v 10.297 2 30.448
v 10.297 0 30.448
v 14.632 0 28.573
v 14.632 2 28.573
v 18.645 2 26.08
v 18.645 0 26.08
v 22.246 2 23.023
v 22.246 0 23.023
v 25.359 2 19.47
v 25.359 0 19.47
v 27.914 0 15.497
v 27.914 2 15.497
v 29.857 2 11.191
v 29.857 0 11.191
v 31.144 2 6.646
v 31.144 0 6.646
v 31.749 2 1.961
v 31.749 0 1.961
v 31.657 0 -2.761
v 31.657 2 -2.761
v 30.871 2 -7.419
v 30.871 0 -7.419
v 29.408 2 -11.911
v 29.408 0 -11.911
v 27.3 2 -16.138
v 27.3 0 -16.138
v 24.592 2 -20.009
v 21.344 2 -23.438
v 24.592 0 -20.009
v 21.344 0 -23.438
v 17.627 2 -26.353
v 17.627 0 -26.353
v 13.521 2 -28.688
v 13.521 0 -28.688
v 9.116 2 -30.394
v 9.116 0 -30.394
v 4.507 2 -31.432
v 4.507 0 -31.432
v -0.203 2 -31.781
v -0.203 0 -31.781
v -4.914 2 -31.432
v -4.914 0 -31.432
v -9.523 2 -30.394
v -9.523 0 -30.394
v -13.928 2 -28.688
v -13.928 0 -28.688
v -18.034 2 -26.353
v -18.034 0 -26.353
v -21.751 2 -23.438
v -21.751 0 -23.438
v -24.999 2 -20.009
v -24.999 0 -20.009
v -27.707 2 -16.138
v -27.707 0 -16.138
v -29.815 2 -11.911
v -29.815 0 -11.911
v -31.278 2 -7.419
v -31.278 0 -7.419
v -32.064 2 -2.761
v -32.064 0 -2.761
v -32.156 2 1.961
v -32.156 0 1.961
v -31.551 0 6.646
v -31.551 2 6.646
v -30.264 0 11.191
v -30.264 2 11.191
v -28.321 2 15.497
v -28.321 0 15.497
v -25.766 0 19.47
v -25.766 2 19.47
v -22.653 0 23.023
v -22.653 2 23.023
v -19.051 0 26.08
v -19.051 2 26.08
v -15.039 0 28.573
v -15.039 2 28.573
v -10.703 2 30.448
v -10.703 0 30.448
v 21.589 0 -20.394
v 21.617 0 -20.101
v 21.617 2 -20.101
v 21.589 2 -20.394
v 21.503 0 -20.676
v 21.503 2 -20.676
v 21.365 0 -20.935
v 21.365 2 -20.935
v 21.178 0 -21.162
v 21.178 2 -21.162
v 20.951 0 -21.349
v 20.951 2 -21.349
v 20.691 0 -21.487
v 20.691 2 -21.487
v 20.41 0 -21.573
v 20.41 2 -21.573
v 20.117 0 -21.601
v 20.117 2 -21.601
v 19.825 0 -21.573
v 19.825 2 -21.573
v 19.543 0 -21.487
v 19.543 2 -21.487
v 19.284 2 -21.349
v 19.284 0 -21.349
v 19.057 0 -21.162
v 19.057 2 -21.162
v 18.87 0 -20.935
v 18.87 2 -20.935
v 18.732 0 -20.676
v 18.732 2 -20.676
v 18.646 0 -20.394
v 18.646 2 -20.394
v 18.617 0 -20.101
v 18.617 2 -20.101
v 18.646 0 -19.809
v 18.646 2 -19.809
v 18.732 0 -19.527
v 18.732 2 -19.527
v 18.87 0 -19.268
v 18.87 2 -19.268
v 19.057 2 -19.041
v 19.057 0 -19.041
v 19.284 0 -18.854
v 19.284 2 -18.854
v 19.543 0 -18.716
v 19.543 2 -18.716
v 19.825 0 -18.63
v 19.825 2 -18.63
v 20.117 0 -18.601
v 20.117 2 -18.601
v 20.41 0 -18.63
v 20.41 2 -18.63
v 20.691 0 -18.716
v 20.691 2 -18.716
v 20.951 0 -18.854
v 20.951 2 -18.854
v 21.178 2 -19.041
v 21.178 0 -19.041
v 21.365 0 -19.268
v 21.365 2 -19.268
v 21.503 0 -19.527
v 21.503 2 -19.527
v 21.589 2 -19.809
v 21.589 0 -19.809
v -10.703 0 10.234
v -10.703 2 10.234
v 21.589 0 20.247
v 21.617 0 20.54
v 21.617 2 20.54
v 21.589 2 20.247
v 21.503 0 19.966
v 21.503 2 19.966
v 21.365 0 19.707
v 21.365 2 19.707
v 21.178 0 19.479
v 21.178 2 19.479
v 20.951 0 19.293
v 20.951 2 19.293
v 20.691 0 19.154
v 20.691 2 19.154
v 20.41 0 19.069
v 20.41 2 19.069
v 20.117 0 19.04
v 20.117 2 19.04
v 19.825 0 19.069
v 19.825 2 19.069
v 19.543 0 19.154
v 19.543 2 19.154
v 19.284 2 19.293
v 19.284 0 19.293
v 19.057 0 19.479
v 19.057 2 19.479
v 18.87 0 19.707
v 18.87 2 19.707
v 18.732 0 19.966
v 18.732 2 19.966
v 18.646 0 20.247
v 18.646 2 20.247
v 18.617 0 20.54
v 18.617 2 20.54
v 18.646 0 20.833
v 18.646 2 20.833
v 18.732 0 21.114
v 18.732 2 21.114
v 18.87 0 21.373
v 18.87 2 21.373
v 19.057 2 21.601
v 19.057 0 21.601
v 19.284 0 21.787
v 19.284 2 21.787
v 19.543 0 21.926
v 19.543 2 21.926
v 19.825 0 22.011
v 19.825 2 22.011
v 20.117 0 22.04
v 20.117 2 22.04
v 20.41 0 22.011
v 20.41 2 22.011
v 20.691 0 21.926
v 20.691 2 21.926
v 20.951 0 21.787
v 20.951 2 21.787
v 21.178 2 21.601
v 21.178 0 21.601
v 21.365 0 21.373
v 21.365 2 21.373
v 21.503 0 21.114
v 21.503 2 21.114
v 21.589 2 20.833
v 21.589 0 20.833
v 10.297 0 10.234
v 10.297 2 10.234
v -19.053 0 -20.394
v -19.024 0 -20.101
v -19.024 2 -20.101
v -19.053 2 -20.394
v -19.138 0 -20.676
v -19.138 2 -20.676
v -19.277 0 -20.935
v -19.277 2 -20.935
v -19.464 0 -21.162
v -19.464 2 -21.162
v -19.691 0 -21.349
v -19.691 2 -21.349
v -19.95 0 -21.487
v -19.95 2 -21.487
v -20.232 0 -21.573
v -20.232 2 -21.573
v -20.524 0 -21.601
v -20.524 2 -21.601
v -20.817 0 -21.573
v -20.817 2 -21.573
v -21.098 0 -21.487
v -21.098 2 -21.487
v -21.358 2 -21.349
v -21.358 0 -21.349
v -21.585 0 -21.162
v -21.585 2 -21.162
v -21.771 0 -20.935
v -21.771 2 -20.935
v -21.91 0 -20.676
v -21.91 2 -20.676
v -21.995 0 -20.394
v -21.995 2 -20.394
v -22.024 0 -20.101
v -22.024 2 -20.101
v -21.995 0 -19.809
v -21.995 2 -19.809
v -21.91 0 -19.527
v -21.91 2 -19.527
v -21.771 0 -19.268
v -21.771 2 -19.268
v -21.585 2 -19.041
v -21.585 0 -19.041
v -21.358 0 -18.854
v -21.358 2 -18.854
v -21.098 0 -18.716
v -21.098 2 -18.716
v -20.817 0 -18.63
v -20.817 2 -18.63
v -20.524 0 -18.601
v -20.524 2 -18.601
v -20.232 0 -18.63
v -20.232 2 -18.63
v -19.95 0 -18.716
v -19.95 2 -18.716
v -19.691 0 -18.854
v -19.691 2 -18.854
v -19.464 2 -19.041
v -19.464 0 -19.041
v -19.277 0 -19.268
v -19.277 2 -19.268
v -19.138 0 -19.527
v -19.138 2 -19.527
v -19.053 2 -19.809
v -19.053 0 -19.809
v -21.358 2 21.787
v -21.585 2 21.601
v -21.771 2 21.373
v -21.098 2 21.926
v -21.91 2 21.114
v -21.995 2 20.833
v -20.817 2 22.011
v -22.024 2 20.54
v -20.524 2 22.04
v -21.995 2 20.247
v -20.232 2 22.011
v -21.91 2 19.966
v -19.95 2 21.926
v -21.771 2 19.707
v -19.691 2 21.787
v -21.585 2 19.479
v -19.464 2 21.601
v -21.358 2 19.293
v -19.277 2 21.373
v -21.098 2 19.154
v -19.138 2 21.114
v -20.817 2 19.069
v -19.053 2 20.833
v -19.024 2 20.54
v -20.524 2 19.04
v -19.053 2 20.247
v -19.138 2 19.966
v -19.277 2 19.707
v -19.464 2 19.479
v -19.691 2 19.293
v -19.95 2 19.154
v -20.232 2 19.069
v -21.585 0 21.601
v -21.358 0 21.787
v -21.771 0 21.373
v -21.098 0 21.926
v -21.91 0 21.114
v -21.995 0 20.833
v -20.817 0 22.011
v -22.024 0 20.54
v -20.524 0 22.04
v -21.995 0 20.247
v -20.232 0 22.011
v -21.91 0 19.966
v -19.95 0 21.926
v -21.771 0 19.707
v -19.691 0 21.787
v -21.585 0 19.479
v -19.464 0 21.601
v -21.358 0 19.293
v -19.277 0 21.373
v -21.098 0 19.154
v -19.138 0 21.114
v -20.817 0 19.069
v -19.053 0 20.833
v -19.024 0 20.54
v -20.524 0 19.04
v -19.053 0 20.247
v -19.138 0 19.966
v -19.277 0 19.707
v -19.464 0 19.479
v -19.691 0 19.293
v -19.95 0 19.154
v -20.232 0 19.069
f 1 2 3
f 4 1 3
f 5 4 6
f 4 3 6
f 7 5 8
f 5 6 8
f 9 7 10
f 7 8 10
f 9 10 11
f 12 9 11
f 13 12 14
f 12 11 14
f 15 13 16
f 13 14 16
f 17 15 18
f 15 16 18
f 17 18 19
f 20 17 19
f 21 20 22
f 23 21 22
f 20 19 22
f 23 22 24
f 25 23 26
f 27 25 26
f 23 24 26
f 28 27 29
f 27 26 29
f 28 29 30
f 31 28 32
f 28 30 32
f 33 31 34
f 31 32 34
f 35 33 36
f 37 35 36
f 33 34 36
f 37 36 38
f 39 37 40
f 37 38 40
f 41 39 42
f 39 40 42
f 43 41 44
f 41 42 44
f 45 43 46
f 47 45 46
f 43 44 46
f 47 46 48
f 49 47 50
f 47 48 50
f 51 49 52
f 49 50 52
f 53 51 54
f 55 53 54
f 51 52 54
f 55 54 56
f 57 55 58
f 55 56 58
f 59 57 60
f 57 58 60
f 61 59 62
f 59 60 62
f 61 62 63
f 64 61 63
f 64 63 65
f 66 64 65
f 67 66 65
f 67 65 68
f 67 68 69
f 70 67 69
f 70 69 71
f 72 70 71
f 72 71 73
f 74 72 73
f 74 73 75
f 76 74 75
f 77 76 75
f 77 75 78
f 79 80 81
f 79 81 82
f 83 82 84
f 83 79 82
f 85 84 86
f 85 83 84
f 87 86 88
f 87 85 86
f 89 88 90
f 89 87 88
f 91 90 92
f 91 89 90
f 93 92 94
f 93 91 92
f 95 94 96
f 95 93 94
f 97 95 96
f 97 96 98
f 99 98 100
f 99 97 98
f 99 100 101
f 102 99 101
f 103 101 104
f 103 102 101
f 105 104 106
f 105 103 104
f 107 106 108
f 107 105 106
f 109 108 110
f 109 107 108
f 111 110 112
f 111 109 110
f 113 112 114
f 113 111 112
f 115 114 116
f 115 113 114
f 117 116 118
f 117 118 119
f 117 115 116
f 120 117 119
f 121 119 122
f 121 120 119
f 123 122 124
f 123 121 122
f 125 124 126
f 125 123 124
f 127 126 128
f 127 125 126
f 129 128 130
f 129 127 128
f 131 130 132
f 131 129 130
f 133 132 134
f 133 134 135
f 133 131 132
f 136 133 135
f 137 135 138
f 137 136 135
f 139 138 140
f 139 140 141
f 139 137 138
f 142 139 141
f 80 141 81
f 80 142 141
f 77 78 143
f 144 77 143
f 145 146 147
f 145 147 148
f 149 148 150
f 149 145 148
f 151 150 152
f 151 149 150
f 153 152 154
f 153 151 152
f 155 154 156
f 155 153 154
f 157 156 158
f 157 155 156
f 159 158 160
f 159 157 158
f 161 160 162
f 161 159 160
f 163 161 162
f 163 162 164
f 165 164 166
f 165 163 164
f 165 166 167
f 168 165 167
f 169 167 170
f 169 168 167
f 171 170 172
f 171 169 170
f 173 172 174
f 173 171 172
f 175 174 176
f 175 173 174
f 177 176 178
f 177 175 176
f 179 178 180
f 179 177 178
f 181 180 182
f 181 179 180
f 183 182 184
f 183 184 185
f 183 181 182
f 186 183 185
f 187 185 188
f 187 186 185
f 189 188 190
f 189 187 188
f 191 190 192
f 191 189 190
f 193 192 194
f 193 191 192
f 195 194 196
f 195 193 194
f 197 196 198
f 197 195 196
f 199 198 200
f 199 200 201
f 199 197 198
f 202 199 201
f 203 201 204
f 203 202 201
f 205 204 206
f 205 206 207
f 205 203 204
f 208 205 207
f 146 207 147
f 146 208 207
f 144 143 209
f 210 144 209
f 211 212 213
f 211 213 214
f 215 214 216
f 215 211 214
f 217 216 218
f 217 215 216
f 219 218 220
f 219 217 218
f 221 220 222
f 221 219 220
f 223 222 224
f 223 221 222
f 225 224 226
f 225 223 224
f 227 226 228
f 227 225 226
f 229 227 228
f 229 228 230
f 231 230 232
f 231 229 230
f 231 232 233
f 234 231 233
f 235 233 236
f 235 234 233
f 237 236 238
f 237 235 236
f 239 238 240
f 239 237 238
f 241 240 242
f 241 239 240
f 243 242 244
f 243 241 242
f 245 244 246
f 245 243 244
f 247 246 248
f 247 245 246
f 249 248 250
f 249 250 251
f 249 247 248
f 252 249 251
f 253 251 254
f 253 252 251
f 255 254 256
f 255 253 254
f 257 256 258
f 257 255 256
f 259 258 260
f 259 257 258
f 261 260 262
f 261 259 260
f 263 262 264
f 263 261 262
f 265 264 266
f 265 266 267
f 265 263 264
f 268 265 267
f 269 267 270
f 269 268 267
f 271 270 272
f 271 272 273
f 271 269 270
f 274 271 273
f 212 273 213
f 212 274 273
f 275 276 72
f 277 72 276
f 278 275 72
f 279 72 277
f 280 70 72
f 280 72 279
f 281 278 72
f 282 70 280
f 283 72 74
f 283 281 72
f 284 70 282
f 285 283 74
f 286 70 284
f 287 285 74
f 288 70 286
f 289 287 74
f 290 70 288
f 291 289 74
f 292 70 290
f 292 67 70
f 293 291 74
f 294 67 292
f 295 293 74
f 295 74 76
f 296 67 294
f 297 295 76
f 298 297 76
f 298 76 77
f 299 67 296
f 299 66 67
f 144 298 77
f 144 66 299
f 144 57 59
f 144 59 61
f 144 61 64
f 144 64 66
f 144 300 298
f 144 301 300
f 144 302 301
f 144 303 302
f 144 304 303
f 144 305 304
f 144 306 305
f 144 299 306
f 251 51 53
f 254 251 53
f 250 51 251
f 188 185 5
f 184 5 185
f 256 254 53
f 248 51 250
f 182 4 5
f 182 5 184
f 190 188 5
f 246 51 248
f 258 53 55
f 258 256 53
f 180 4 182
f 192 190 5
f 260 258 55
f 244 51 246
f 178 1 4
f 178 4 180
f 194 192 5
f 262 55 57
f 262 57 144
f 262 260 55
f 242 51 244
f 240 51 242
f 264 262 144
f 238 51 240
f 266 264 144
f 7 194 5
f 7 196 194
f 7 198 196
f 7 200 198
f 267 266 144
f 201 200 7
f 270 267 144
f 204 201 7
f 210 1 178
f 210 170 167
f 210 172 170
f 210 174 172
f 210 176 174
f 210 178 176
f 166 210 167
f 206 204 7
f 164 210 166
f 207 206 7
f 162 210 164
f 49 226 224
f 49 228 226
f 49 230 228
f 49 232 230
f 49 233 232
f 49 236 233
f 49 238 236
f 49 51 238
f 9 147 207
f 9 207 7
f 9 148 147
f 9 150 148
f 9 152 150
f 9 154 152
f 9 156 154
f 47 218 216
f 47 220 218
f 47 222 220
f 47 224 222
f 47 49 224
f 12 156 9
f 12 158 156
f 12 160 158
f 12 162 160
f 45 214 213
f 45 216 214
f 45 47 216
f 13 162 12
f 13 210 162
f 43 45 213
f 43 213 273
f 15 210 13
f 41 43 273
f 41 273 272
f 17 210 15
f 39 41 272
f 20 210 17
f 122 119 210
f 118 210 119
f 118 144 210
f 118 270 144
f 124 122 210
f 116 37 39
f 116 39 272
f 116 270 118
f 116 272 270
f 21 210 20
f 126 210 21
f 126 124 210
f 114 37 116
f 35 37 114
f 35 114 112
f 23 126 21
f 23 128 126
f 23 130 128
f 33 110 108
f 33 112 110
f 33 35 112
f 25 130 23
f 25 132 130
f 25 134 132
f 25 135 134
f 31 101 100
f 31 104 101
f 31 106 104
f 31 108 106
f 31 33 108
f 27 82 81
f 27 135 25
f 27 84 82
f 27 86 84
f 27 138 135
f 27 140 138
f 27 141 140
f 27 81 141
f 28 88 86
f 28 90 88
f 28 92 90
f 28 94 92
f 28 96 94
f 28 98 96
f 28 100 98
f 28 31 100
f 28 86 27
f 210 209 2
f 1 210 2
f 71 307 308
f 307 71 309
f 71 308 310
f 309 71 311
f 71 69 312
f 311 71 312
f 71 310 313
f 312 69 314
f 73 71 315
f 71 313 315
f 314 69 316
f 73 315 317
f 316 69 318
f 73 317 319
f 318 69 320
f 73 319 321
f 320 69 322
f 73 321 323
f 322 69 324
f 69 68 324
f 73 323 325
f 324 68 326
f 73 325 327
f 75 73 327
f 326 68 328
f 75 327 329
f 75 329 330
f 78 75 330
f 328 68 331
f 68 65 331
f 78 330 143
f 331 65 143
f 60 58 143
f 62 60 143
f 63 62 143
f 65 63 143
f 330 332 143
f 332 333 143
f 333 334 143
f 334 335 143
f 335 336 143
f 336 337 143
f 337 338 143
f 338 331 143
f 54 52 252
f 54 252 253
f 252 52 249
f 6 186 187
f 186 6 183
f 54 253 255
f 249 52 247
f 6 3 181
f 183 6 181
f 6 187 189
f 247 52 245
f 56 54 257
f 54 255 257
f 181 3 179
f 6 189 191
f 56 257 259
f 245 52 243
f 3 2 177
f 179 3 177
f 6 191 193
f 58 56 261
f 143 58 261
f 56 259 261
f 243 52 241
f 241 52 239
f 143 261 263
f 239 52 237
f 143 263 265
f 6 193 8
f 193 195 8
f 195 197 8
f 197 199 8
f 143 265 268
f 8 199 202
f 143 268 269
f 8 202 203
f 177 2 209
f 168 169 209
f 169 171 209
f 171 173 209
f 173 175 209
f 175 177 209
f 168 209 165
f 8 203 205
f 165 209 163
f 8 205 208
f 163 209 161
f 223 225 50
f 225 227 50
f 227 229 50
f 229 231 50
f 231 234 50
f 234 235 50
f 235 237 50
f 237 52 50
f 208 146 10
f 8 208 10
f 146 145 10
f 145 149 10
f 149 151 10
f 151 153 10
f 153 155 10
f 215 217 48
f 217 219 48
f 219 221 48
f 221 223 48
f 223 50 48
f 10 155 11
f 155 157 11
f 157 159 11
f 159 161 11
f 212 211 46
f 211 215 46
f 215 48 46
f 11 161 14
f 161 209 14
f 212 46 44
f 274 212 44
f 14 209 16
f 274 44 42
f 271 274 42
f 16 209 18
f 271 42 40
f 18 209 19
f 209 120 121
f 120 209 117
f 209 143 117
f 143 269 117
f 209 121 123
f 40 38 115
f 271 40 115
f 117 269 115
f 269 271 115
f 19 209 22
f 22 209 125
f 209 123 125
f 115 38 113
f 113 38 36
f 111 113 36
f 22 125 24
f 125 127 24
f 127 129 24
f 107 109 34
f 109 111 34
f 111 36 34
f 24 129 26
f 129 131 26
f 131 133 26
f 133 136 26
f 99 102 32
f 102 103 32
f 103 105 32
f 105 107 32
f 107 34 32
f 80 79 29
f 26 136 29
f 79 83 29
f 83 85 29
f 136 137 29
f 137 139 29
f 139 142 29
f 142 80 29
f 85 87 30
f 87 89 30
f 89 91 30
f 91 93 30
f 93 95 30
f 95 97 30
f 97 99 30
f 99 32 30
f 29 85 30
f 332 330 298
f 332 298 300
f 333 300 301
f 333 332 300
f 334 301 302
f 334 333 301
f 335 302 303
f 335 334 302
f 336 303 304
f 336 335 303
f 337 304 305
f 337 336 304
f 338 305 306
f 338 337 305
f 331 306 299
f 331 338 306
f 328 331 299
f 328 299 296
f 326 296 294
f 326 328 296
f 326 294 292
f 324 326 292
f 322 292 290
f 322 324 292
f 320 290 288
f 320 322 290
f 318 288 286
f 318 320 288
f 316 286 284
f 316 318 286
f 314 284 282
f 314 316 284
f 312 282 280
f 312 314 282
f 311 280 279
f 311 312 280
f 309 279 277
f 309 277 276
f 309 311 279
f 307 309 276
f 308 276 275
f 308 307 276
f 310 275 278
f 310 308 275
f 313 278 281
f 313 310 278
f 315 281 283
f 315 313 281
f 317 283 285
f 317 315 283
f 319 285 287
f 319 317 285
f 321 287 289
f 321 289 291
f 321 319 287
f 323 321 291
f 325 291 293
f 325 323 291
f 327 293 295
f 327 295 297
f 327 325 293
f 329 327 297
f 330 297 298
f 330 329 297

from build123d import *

# Parameters (mm, degrees)
CROQUIS1_R              = 1.5
SALIENTE_EXTRUIR2_DEPTH = 2


with BuildPart() as part:
    # Croquis1 → Saliente-Extruir2 (new body)
    with BuildSketch(Plane(origin=(0, 0, 0), x_dir=(1, 0, 0), z_dir=(0, 1, 0))):
        with BuildLine():
            Line((10.296518832, -10.234095306), (10.296518832, -30.447615579))
            ThreePointArc((10.296518832, -30.447615579), (-0.203481168, 31.780682421), (-10.703481168, -30.447615579))
            Line((-10.703481168, -30.447615579), (-10.703481168, -10.234095306))
            Line((-10.703481168, -10.234095306), (10.296518832, -10.234095306))
        make_face()
        with Locations((-20.524295325, 20.101496578)):
            Circle(CROQUIS1_R, mode=Mode.SUBTRACT)
        with Locations((20.117332989, 20.101496578)):
            Circle(CROQUIS1_R, mode=Mode.SUBTRACT)
        with Locations((20.117332989, -20.540131736)):
            Circle(CROQUIS1_R, mode=Mode.SUBTRACT)
        with Locations((-20.524295325, -20.540131736)):
            Circle(CROQUIS1_R, mode=Mode.SUBTRACT)
    extrude(amount=SALIENTE_EXTRUIR2_DEPTH)


solid = part.part
